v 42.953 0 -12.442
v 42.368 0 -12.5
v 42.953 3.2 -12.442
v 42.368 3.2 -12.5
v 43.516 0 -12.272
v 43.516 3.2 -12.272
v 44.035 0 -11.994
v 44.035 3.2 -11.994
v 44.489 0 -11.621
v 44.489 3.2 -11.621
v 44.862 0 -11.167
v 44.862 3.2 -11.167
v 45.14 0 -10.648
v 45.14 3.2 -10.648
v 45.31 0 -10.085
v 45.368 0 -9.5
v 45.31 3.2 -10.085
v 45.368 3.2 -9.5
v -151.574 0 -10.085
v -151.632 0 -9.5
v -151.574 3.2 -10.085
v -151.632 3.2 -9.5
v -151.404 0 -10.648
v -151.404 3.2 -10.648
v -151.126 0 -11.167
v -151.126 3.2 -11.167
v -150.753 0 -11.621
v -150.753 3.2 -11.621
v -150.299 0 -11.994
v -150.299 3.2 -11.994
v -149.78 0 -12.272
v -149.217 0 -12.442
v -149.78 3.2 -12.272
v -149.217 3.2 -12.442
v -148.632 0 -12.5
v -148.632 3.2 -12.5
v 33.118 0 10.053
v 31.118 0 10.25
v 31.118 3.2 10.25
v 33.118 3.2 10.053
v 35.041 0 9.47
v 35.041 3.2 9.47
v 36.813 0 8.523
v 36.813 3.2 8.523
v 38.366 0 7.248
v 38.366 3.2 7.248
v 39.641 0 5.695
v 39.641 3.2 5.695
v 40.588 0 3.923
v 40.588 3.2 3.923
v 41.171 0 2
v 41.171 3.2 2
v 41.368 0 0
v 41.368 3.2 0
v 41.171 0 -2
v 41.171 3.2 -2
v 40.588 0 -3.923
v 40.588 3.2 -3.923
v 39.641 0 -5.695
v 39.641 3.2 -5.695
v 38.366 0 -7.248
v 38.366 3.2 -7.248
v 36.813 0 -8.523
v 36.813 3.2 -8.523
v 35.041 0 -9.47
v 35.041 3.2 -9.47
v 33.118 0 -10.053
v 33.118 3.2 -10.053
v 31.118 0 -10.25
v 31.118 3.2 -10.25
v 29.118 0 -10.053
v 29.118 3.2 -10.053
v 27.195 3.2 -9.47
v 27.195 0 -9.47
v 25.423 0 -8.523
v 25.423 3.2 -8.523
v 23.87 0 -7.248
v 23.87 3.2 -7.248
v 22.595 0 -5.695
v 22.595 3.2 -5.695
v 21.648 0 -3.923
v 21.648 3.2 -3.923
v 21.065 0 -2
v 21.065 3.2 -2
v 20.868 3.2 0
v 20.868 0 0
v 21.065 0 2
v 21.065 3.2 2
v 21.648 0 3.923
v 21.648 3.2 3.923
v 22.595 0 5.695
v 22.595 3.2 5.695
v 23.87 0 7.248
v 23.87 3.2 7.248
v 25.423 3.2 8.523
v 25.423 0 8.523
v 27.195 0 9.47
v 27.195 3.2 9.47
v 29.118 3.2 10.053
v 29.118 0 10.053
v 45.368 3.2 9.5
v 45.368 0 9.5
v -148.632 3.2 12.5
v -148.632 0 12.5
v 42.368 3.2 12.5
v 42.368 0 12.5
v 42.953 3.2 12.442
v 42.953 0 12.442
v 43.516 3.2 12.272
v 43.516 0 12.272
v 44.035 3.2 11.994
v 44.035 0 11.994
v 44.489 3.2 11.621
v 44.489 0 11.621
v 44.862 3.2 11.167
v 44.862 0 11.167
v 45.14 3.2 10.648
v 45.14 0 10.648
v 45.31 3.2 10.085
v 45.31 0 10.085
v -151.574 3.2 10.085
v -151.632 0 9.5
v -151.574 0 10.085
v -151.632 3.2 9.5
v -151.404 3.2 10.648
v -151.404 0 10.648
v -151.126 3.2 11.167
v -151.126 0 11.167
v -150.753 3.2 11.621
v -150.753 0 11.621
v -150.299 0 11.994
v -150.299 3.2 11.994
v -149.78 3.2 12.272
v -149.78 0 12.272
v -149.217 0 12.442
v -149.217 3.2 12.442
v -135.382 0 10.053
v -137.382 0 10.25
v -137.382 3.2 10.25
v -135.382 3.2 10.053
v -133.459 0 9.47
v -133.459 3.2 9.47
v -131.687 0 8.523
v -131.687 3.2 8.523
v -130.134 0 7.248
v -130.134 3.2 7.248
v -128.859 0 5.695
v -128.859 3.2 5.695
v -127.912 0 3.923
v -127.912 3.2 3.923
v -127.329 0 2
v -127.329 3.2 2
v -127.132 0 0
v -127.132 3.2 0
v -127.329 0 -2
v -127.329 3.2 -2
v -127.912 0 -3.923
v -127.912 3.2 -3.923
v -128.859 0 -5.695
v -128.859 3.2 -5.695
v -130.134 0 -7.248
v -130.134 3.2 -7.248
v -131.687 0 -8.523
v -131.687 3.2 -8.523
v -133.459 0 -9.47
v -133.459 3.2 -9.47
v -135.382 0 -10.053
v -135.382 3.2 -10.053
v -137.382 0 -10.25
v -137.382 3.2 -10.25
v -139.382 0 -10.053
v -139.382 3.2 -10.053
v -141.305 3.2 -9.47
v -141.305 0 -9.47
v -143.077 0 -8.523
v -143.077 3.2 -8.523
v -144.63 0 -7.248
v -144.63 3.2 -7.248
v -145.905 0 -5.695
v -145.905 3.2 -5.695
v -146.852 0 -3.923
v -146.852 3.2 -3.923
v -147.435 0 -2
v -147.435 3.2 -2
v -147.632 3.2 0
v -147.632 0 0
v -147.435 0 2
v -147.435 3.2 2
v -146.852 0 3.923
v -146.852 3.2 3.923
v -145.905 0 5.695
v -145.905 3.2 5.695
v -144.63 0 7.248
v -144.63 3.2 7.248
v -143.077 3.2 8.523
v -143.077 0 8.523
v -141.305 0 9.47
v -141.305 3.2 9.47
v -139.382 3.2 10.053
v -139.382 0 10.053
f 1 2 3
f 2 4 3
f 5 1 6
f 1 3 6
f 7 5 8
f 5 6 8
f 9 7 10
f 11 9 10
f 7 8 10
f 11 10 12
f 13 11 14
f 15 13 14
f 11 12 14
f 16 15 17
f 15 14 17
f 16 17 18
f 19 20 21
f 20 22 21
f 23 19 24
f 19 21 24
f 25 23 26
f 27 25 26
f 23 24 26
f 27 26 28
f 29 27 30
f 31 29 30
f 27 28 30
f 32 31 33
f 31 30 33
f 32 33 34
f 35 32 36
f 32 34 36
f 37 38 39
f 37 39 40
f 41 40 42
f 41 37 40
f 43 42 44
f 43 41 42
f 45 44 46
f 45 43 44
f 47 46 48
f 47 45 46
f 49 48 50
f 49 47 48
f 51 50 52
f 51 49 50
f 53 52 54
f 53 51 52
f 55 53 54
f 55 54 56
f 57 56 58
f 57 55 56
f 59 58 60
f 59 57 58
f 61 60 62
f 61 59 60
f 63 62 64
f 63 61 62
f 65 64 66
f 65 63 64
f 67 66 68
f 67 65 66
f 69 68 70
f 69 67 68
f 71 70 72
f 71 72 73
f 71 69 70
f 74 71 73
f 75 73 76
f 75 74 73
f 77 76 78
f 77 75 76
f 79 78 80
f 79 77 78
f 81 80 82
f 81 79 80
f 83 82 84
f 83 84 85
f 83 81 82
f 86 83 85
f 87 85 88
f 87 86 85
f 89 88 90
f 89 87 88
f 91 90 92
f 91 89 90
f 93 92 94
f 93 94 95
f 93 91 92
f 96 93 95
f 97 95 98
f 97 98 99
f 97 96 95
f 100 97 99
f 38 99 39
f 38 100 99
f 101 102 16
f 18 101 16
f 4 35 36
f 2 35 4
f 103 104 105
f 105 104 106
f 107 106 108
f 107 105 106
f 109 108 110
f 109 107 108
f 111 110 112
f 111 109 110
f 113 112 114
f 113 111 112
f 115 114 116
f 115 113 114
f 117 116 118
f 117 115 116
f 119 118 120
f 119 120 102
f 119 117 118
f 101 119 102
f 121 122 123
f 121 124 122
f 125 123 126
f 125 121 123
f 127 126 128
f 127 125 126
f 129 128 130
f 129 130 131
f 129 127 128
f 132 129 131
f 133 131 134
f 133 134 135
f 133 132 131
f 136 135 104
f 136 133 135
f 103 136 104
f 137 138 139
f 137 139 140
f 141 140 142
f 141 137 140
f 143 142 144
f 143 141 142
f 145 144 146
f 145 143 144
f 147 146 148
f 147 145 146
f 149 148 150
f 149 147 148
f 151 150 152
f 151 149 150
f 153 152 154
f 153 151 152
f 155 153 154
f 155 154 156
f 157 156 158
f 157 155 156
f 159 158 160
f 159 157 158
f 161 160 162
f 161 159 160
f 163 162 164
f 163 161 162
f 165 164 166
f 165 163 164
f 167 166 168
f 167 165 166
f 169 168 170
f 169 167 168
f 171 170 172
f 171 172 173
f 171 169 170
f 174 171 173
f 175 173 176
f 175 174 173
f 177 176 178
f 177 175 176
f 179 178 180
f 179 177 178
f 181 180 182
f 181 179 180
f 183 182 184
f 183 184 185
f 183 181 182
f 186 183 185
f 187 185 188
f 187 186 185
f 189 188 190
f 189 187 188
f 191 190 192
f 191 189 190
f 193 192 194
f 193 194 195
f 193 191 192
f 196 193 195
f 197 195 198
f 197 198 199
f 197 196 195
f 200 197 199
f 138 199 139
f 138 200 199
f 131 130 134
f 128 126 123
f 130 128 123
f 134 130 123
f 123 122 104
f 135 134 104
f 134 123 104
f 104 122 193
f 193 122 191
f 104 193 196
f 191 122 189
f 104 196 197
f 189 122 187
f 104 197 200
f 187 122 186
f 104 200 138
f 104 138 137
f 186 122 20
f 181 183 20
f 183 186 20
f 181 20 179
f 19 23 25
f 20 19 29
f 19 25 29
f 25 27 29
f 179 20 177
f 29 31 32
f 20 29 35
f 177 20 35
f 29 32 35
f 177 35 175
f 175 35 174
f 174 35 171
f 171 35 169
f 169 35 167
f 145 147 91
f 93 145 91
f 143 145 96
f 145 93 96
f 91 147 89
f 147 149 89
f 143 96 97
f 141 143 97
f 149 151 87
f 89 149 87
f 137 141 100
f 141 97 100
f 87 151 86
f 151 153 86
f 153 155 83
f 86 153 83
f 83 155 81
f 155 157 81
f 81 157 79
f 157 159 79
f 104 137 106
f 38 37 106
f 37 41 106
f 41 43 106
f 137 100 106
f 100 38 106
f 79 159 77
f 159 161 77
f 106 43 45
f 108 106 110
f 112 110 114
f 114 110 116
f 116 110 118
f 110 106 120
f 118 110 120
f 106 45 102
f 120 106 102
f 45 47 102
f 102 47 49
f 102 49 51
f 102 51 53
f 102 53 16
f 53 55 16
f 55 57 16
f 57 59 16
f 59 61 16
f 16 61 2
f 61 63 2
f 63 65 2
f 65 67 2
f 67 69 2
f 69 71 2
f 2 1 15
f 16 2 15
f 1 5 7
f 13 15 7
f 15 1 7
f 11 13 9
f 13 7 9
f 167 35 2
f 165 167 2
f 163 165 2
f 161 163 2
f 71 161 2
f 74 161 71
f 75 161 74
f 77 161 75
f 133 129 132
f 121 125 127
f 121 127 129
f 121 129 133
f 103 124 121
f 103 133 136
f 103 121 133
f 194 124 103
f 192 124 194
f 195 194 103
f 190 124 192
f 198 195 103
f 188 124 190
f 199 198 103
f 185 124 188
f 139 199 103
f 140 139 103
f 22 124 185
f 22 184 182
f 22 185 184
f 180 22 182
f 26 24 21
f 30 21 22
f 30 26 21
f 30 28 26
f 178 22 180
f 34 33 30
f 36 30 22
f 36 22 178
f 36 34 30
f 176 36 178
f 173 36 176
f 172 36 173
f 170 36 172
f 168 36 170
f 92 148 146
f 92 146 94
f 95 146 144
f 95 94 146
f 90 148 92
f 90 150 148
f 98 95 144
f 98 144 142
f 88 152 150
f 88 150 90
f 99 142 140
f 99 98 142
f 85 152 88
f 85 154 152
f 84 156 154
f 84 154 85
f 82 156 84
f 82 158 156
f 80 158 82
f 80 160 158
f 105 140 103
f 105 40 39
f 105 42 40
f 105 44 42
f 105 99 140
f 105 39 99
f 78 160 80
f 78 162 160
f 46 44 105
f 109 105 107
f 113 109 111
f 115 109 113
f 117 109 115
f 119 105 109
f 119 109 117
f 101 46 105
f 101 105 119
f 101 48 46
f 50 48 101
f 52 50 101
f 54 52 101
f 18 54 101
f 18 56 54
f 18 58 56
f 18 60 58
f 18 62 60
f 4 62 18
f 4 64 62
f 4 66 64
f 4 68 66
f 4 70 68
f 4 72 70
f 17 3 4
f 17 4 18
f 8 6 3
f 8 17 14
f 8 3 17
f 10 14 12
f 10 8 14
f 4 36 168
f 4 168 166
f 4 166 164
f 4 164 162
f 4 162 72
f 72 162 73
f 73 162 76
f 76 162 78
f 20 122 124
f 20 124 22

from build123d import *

# Parameters (mm, degrees)
SKETCH1_W           = 197
SKETCH1_H           = 25
SKETCH1_R           = 10.25
BOSS_EXTRUDE1_DEPTH = 3.2
FILLET1_R           = 3


with BuildPart() as part:
    # Sketch1 → Boss-Extrude1 (new body)
    with BuildSketch(Plane(origin=(0, 0, 0), x_dir=(1, 0, 0), z_dir=(0, 1, 0))):
        with Locations((-53.132, 0)):
            Rectangle(SKETCH1_W, SKETCH1_H)
        with Locations(Location((31.118, 0, 0), (0, 0, 270))):
            Circle(SKETCH1_R, mode=Mode.SUBTRACT)
        with Locations(Location((-137.382, 0, 0), (0, 0, 270))):
            Circle(SKETCH1_R, mode=Mode.SUBTRACT)
    extrude(amount=BOSS_EXTRUDE1_DEPTH)

    # Fillet1
    fillet1_edges = [part.edges().sort_by_distance(p)[0] for p in [
        (45.368, 1.6, -12.5),
        (45.368, 1.6, 12.5),
        (-151.632, 1.6, 12.5),
        (-151.632, 1.6, -12.5),
    ]]
    fillet(fillet1_edges, radius=FILLET1_R)


solid = part.part
